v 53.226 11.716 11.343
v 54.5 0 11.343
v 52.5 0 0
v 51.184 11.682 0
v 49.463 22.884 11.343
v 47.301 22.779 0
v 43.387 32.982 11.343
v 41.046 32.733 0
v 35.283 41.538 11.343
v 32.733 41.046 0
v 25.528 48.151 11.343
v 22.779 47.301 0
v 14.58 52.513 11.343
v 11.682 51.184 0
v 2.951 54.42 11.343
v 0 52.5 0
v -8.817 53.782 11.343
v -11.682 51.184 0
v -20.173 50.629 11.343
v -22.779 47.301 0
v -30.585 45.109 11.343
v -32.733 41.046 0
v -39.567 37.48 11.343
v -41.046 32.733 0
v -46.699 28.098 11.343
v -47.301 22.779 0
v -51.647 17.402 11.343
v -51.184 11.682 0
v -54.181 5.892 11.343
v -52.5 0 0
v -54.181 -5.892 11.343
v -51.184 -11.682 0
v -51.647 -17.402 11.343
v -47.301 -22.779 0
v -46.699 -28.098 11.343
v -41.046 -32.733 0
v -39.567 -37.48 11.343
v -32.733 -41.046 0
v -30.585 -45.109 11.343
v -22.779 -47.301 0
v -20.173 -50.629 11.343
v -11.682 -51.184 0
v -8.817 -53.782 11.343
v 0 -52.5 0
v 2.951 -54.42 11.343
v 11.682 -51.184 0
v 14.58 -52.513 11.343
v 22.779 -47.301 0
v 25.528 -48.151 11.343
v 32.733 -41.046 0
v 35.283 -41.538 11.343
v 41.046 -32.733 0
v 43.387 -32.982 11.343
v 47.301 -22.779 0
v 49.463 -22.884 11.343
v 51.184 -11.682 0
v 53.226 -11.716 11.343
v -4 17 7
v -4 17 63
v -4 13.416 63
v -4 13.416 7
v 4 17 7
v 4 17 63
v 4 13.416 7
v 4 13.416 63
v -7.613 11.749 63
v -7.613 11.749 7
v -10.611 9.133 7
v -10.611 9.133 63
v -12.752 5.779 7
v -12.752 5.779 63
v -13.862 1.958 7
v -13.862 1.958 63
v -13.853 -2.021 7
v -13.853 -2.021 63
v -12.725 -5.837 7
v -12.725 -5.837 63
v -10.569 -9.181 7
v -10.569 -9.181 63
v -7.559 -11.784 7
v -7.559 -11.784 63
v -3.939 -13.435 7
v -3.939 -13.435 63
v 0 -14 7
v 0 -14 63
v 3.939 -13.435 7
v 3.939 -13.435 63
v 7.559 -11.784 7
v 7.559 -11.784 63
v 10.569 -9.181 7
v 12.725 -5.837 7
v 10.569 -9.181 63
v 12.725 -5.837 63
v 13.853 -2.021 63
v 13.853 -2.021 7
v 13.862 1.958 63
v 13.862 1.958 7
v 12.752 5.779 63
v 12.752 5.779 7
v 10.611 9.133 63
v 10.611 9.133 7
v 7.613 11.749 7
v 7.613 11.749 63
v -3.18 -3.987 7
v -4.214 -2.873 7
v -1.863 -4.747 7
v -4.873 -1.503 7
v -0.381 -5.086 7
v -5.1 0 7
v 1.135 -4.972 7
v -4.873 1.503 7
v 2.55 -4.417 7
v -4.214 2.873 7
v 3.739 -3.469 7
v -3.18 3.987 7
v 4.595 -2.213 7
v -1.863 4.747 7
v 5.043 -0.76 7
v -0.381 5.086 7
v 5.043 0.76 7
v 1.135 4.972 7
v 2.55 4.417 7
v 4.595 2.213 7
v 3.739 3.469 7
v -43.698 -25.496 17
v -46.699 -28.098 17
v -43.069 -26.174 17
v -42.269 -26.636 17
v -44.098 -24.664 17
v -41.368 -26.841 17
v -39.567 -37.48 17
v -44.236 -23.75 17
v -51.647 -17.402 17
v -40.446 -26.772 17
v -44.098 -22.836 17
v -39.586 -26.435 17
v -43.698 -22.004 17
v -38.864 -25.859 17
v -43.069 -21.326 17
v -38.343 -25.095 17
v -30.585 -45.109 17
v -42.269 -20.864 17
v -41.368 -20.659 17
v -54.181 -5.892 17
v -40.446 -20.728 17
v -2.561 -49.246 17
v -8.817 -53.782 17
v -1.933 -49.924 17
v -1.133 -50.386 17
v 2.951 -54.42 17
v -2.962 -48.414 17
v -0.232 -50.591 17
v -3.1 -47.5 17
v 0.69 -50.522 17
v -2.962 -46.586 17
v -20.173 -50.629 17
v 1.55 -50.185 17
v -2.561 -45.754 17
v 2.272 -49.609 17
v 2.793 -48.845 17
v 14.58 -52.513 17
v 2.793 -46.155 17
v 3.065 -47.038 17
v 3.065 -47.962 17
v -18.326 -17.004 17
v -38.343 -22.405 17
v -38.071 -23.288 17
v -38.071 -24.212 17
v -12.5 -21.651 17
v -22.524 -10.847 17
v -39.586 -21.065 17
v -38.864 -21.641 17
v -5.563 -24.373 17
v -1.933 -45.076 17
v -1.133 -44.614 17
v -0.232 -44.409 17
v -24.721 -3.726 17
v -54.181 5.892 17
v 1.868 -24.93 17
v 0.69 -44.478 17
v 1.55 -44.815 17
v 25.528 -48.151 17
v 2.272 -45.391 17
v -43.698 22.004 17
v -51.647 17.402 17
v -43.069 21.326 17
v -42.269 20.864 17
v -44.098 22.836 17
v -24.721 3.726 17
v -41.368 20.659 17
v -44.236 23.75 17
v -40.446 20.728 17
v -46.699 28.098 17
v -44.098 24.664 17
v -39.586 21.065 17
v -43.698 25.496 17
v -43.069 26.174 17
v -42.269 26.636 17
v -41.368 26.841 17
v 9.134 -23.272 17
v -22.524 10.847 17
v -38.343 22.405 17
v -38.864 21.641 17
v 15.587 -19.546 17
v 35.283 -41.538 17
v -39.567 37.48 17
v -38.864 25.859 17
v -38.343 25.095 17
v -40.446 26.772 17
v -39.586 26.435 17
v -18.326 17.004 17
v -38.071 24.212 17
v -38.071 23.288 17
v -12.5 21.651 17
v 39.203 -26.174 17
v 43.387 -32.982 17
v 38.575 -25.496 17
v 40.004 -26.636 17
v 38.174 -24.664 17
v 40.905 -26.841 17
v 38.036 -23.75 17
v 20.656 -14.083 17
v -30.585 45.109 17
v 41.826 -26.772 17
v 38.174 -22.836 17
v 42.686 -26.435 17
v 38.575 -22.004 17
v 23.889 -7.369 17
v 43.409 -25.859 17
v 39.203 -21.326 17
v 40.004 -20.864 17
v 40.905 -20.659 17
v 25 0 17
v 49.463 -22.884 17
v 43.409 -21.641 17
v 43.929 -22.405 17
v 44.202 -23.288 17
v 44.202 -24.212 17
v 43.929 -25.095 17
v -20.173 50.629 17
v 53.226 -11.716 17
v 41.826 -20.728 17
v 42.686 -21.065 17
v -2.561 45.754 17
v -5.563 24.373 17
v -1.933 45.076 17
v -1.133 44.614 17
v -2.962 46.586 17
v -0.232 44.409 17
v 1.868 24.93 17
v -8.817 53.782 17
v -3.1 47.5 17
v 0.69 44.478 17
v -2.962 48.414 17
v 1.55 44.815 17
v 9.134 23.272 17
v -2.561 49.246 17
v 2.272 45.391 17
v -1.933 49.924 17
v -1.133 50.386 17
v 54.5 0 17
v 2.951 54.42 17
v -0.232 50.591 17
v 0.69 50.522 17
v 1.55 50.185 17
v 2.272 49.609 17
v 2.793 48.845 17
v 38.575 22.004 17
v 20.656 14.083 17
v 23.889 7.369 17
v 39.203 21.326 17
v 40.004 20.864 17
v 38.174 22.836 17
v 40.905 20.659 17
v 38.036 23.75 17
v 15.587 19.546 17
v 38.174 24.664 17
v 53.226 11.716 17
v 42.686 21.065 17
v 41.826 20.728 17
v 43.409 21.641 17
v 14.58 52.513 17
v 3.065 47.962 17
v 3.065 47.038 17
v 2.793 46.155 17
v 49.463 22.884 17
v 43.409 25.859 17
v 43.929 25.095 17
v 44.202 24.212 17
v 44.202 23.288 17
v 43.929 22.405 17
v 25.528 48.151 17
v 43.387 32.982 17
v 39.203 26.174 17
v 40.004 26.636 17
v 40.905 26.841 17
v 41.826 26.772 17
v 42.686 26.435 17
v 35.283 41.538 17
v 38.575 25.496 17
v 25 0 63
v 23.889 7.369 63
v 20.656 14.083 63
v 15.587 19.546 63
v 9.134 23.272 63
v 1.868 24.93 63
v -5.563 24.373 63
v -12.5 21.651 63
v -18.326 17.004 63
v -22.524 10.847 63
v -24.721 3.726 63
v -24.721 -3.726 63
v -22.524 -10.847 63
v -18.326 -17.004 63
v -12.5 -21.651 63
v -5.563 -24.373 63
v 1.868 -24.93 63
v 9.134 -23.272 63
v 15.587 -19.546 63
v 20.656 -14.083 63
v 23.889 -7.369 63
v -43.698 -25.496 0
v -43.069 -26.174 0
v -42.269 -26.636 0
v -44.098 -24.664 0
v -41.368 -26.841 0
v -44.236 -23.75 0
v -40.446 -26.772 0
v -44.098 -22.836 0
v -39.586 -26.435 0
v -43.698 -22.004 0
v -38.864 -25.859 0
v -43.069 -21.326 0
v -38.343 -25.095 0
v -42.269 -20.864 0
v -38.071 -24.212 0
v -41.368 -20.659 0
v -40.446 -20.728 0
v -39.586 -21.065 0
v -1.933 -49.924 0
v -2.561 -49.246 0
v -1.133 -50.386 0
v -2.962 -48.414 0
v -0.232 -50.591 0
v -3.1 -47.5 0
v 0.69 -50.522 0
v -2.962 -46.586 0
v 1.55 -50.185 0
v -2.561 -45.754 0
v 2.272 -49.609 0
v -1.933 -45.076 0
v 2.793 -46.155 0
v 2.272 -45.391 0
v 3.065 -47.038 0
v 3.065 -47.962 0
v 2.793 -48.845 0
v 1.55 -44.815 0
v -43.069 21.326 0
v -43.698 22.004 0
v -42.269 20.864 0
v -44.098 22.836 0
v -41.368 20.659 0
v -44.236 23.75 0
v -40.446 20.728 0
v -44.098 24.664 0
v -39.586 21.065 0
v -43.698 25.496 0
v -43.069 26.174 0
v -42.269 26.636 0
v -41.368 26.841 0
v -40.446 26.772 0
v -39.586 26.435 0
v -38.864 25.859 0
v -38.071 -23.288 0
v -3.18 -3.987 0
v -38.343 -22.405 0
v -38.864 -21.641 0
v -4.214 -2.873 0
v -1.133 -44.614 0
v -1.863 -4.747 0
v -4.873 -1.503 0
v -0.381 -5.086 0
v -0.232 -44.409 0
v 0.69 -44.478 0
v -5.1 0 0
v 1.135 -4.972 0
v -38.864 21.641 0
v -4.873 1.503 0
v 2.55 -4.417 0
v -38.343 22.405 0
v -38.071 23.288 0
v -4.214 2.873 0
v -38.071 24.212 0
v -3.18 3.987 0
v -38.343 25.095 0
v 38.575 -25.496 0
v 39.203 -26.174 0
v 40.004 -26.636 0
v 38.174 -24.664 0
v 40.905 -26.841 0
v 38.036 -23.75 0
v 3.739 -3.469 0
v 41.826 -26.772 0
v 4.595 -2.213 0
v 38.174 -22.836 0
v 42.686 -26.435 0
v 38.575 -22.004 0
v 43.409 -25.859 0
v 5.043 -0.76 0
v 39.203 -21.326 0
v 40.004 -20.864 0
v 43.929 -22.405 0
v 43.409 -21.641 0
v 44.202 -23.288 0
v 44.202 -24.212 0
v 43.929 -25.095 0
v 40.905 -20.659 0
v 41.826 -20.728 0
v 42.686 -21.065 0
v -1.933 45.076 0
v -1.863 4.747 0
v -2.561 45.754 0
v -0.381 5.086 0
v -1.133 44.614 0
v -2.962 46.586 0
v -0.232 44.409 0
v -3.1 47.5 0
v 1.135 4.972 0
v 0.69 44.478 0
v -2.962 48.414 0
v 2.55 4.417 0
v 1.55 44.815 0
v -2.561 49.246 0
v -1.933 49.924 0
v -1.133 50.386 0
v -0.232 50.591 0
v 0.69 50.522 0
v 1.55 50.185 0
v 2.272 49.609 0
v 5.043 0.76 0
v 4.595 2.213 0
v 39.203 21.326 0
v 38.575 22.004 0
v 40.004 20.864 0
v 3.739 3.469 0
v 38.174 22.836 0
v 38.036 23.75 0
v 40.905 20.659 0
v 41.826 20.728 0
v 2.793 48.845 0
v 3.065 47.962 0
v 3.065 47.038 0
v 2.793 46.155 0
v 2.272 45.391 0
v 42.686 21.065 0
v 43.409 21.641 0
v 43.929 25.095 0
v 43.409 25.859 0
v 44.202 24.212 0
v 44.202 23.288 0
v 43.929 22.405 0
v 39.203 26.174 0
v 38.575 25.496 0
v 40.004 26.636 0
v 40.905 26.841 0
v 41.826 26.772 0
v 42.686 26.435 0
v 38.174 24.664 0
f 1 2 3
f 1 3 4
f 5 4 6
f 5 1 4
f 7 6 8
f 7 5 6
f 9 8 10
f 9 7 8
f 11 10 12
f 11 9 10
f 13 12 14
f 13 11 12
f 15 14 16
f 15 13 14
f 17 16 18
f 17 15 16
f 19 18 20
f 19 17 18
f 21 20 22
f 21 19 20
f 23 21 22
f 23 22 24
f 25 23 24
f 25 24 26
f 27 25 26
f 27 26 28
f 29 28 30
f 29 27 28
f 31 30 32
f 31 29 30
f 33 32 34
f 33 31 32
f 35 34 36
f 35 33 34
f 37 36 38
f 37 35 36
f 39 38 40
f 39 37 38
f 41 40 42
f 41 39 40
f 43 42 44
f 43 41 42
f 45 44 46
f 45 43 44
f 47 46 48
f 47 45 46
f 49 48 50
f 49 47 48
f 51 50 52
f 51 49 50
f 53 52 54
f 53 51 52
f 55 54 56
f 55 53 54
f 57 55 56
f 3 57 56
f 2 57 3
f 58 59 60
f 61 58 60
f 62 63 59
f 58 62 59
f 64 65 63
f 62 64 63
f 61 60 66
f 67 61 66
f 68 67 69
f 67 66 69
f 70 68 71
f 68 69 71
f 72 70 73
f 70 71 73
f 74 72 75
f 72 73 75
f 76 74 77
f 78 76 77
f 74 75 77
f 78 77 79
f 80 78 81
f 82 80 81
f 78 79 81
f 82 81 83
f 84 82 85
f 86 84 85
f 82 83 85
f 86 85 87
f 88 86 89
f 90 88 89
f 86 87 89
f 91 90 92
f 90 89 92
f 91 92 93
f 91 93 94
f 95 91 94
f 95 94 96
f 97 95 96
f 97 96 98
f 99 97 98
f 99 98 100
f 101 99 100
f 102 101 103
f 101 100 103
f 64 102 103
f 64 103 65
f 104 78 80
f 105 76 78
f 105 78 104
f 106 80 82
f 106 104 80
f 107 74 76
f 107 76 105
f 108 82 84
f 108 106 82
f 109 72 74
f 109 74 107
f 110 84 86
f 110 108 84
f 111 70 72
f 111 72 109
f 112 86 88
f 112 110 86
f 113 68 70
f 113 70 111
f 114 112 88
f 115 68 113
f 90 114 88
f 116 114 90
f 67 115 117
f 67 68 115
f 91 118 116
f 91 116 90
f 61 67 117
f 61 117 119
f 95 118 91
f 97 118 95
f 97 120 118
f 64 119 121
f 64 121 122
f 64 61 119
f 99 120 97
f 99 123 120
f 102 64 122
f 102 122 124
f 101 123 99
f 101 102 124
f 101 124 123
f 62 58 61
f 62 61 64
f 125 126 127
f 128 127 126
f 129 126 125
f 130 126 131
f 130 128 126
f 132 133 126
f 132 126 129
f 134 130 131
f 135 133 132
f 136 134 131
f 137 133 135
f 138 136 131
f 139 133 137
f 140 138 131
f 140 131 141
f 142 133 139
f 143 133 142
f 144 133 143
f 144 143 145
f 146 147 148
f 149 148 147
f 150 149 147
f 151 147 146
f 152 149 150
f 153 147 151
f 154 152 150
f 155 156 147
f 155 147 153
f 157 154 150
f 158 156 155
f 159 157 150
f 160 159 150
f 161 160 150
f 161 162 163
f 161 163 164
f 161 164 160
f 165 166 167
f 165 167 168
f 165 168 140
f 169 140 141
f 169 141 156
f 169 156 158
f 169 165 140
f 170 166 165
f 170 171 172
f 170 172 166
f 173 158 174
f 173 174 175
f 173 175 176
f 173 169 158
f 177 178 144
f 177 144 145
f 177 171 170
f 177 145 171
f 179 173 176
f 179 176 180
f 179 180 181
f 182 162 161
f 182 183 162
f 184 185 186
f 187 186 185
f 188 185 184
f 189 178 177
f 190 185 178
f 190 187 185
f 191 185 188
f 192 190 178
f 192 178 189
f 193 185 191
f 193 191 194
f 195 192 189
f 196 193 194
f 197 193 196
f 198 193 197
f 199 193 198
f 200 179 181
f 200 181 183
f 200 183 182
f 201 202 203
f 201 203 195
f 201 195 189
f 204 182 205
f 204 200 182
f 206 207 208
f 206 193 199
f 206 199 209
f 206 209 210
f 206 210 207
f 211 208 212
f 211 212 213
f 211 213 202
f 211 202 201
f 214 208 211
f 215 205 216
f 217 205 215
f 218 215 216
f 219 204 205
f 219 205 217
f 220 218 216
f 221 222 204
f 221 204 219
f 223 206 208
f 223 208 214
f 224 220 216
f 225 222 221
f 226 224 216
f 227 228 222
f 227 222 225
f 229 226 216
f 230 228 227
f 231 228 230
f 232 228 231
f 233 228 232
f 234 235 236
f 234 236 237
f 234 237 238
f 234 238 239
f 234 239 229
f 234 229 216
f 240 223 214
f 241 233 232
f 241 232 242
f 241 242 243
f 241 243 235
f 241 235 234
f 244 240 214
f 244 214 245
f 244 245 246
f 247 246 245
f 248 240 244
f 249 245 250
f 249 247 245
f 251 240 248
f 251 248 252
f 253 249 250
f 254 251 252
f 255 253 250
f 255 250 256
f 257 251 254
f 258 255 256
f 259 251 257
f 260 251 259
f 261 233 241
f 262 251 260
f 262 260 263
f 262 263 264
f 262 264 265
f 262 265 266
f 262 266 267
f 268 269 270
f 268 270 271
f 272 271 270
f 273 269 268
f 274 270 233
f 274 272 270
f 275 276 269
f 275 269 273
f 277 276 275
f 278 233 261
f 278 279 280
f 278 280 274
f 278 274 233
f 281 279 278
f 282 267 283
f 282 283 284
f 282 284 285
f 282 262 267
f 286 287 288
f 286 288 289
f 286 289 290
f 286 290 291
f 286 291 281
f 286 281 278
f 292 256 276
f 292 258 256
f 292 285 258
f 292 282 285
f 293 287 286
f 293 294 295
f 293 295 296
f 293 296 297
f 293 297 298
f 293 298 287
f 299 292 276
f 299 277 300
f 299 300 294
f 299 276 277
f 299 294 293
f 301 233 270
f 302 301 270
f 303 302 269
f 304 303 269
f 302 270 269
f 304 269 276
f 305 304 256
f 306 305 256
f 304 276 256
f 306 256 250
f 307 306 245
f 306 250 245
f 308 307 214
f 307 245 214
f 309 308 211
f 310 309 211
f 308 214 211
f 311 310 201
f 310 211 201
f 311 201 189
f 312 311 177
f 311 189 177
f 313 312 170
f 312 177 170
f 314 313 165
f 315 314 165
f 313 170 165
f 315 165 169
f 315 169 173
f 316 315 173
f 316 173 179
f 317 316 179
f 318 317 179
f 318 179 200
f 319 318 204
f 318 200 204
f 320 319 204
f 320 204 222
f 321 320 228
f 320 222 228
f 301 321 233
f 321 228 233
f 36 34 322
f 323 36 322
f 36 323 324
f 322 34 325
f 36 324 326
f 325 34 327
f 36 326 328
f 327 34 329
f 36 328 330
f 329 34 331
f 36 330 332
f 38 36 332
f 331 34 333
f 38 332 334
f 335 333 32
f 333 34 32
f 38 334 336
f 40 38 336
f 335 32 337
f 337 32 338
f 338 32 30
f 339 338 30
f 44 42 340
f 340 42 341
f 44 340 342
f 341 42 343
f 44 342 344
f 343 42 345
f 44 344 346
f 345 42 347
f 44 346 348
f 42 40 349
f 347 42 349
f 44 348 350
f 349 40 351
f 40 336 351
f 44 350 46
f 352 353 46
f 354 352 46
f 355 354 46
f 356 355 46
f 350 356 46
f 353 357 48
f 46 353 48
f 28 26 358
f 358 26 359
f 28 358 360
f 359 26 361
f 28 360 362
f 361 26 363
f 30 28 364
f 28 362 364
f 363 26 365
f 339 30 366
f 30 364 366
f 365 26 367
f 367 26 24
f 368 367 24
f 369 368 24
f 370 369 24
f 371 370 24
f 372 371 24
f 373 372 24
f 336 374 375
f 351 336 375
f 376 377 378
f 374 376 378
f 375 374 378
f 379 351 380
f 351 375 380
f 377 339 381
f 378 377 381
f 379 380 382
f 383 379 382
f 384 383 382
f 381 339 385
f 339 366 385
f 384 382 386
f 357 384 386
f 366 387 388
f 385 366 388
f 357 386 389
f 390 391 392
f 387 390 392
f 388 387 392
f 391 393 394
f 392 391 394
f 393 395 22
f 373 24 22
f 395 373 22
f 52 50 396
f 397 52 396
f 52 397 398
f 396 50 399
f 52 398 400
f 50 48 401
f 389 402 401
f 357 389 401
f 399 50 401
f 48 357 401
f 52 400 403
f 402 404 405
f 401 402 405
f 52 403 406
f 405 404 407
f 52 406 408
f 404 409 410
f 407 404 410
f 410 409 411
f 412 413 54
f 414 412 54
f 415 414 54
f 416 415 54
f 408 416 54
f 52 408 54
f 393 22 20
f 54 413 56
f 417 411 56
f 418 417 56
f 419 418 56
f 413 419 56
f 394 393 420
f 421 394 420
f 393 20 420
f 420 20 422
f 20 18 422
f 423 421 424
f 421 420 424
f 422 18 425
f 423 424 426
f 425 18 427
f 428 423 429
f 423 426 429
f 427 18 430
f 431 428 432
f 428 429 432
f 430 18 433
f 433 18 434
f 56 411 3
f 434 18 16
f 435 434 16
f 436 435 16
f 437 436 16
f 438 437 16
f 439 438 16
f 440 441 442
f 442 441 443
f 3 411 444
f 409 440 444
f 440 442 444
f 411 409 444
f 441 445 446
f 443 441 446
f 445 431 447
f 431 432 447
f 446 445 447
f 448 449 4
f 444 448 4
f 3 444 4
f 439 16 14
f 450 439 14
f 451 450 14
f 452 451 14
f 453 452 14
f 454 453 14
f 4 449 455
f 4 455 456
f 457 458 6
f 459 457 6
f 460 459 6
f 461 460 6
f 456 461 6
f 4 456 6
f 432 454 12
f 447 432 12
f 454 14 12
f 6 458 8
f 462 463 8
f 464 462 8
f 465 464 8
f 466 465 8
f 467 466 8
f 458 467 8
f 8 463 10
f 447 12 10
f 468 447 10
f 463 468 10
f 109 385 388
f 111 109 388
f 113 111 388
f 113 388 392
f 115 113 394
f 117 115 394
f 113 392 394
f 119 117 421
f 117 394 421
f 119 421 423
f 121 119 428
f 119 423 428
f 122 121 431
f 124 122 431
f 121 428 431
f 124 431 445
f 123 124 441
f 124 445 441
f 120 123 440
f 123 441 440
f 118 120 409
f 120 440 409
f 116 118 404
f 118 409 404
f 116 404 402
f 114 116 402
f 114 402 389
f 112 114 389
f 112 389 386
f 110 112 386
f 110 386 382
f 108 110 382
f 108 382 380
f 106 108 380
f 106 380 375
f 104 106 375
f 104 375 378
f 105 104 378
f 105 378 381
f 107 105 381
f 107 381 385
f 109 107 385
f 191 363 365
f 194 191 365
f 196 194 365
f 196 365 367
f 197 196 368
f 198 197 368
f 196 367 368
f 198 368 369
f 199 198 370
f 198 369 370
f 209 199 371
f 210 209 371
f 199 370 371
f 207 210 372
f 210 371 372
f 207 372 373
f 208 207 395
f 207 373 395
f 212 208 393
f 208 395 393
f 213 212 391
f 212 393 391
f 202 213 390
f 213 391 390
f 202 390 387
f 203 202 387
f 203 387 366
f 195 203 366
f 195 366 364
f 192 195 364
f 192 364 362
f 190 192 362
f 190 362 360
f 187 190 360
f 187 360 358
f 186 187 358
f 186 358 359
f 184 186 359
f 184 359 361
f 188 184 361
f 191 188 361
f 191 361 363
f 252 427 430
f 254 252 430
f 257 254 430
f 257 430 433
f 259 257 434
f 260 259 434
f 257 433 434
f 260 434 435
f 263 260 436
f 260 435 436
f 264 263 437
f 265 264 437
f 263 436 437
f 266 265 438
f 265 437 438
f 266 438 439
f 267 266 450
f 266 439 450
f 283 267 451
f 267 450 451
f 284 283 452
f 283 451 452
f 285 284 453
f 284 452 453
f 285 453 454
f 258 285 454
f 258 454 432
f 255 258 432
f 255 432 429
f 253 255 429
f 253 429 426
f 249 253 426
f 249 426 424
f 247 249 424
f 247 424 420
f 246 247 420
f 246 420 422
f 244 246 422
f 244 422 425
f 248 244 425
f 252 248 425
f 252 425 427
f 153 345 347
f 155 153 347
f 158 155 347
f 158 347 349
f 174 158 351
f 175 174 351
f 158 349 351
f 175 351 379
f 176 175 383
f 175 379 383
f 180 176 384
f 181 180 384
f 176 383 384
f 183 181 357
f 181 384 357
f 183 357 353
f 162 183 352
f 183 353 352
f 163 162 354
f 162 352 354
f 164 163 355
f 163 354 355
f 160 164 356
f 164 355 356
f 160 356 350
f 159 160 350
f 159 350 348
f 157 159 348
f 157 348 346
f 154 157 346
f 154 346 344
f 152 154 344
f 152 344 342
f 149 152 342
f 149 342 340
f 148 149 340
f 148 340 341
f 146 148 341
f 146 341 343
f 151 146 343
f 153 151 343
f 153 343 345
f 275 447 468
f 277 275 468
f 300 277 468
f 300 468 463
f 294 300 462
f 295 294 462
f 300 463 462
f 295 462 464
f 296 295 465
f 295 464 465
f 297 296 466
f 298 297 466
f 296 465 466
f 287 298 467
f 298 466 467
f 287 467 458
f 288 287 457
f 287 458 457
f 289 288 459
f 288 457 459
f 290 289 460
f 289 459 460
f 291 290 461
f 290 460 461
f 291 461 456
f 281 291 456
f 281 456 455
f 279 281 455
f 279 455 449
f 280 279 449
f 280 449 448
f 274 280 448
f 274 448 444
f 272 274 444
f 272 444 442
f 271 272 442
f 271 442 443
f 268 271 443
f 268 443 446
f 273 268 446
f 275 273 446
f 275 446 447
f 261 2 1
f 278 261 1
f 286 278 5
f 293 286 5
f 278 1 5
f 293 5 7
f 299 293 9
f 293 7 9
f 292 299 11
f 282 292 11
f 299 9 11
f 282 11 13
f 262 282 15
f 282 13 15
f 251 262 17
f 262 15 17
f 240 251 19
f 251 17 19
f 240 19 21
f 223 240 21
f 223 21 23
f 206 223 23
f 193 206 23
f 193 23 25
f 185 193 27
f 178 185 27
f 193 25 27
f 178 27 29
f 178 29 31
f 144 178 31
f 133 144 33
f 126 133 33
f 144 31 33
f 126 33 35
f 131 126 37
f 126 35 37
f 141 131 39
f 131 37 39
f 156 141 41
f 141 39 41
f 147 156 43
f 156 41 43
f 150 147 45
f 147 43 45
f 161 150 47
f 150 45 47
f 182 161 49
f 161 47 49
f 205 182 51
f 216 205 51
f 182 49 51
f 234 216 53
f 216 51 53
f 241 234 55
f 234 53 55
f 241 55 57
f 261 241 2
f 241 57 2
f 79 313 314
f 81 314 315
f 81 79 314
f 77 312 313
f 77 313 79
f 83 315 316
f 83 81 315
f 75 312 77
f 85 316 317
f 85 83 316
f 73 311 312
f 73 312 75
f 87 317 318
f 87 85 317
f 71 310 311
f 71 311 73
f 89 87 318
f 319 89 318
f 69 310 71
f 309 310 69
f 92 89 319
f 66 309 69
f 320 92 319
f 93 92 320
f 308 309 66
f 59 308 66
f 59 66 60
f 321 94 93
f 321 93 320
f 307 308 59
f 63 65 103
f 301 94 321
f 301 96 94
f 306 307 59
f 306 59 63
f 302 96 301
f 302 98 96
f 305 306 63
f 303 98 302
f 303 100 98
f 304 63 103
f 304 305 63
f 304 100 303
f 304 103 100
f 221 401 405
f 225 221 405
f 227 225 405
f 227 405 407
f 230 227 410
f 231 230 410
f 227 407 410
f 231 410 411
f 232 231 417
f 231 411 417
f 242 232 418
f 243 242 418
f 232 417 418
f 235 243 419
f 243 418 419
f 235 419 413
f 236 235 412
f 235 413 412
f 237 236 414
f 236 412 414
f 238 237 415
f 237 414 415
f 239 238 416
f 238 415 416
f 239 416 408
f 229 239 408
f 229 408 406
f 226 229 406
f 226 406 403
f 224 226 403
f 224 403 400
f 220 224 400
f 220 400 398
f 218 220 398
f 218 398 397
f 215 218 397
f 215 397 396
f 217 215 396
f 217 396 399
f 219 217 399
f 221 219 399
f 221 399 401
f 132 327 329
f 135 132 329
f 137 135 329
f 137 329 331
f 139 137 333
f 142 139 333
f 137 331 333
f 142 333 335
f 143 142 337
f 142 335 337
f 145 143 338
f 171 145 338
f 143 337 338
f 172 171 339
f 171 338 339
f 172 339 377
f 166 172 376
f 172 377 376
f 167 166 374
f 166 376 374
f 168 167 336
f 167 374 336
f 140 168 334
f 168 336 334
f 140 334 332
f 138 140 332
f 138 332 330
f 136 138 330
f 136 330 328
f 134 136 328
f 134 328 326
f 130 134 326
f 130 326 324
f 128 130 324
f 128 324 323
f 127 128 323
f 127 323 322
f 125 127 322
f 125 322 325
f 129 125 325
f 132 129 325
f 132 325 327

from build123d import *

# Parameters (mm, degrees)
ESQUISSE1_R             = 54.5
BOSS_EXTRU_1_DEPTH      = 17
ESQUISSE5_R             = 25
BOSS_EXTRU_4_DEPTH      = 46
ENL_V_MAT_EXTRU_2_DEPTH = 56
ESQUISSE8_R             = 5.1
ENL_V_MAT_EXTRU_3_DEPTH = 76
ESQUISSE9_R             = 3.1
ENL_V_MAT_EXTRU_4_DEPTH = 76
CHANFREIN1_SIZE         = 2
CHANFREIN1_SIZE2        = 11.342563639


with BuildPart() as part:
    # Esquisse1 → Boss.-Extru.1 (new body)
    with BuildSketch(Plane.XY):
        Circle(ESQUISSE1_R)
    extrude(amount=BOSS_EXTRU_1_DEPTH)

    # Esquisse5 → Boss.-Extru.4 (add)
    with BuildSketch(Plane.XY.offset(17)):
        Circle(ESQUISSE5_R)
    extrude(amount=BOSS_EXTRU_4_DEPTH)

    # Esquisse7 → Enlèv. mat.-Extru.2 (cut)
    with BuildSketch(Plane.XY.offset(63)):
        with BuildLine():
            Line((-4, 17), (-4, 13.416407865))
            ThreePointArc((-4, 13.416407865), (0, -14), (4, 13.416407865))
            Line((4, 13.416407865), (4, 17))
            Line((4, 17), (-4, 17))
        make_face()
    extrude(amount=-ENL_V_MAT_EXTRU_2_DEPTH, mode=Mode.SUBTRACT)

    # Esquisse8 → Enlèv. mat.-Extru.3 (cut)
    with BuildSketch(Plane(origin=(0, 0, 0), x_dir=(-1, 0, 0), z_dir=(0, 0, -1))):
        Circle(ESQUISSE8_R)
    extrude(amount=-ENL_V_MAT_EXTRU_3_DEPTH, mode=Mode.SUBTRACT)

    # Esquisse9 → Enlèv. mat.-Extru.4 (cut)
    with BuildSketch(Plane(origin=(0, 0, 0), x_dir=(-1, 0, 0), z_dir=(0, 0, -1))):
        with Locations((0, 47.5)):
            Circle(ESQUISSE9_R)
        with Locations((41.13620668, 23.75)):
            Circle(ESQUISSE9_R)
        with Locations((41.13620668, -23.75)):
            Circle(ESQUISSE9_R)
        with Locations((0, -47.5)):
            Circle(ESQUISSE9_R)
        with Locations((-41.13620668, -23.75)):
            Circle(ESQUISSE9_R)
        with Locations((-41.13620668, 23.75)):
            Circle(ESQUISSE9_R)
    extrude(amount=-ENL_V_MAT_EXTRU_4_DEPTH, mode=Mode.SUBTRACT)

    # Chanfrein1
    chanfrein1_edges = [part.edges().sort_by_distance(p)[0] for p in [
        (-54.5, 0, 0),
    ]]
    chanfrein1_side = [part.faces().sort_by_distance(p)[0] for p in [
        (-52.958507217, 0, 0),
    ]]
    chamfer(chanfrein1_edges, length=CHANFREIN1_SIZE, length2=CHANFREIN1_SIZE2, reference=chanfrein1_side[0])


solid = part.part
